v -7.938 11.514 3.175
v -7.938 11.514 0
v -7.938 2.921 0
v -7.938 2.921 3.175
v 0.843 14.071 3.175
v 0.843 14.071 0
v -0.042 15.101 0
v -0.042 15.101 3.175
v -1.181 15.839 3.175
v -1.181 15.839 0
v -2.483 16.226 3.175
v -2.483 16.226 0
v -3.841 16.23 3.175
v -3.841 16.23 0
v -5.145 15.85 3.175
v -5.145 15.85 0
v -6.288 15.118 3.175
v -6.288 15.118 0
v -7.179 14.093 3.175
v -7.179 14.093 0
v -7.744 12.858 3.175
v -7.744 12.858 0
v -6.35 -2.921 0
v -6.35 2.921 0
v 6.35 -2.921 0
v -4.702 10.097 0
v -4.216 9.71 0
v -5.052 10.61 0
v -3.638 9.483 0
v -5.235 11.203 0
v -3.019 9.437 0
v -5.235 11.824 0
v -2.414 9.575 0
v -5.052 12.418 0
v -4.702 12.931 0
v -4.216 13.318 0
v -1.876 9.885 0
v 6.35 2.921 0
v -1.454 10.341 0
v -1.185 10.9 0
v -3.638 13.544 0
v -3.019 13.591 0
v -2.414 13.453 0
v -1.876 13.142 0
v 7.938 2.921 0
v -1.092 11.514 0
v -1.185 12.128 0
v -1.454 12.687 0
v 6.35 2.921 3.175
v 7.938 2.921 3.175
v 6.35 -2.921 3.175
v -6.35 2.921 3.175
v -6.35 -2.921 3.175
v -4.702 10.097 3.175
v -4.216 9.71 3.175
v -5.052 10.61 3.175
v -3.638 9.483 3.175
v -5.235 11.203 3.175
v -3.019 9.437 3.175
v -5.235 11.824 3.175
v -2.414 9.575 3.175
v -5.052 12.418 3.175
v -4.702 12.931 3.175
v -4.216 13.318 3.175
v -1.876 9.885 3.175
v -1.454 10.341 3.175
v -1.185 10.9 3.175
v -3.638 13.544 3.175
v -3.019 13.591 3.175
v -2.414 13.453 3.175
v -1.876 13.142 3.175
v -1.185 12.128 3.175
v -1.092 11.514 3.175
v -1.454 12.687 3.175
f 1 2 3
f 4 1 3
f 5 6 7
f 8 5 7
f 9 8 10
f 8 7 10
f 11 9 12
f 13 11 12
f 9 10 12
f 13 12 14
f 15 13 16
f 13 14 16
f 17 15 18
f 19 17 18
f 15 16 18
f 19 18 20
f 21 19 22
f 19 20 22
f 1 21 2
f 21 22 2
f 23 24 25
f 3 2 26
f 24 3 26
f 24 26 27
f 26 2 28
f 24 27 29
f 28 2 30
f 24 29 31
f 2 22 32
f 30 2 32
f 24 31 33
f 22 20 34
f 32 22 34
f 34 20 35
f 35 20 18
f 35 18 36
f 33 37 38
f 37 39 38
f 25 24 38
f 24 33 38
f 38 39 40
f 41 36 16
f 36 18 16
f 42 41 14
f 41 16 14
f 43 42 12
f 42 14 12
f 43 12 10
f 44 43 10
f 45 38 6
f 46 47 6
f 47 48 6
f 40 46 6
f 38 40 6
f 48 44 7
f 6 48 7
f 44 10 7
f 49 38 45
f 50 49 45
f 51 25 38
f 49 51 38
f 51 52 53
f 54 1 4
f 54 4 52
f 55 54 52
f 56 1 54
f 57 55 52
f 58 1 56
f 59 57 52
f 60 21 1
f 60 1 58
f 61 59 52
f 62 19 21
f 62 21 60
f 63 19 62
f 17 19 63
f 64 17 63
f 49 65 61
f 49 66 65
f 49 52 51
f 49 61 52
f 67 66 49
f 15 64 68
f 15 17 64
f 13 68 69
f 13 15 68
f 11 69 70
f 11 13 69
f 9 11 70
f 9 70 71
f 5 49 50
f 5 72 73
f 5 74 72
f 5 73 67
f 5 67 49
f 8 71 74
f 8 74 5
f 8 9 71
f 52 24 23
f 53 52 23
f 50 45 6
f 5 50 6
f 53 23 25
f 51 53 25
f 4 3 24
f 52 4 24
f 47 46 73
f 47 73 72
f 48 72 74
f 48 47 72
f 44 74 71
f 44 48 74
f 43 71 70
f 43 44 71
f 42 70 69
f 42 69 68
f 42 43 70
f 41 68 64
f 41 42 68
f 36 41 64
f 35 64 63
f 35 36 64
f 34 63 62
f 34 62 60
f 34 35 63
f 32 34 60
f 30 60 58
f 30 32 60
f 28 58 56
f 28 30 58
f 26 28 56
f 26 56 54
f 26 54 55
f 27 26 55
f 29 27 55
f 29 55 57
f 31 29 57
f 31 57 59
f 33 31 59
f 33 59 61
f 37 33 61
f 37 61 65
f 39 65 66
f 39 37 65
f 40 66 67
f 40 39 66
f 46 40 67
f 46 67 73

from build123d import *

# Parameters (mm, degrees)
SKETCH1_R           = 2.0828
BOSS_EXTRUDE1_DEPTH = 3.175


with BuildPart() as part:
    # Sketch1 → Boss-Extrude1 (new body)
    with BuildSketch(Plane.XY):
        with BuildLine():
            Line((7.9375, 2.921), (0.843056521, 14.070553816))
            ThreePointArc((0.843056521, 14.070553816), (-4.506430071, 16.086474021), (-7.9375, 11.5138708))
            Line((-7.9375, 11.5138708), (-7.9375, 2.921))
            Line((-7.9375, 2.921), (-6.35, 2.921))
            Line((-6.35, 2.921), (-6.35, -2.921))
            Line((-6.35, -2.921), (6.35, -2.921))
            Line((6.35, -2.921), (6.35, 2.921))
            Line((6.35, 2.921), (7.9375, 2.921))
        make_face()
        with Locations((-3.175, 11.5138708)):
            Circle(SKETCH1_R, mode=Mode.SUBTRACT)
    extrude(amount=BOSS_EXTRUDE1_DEPTH)


solid = part.part
